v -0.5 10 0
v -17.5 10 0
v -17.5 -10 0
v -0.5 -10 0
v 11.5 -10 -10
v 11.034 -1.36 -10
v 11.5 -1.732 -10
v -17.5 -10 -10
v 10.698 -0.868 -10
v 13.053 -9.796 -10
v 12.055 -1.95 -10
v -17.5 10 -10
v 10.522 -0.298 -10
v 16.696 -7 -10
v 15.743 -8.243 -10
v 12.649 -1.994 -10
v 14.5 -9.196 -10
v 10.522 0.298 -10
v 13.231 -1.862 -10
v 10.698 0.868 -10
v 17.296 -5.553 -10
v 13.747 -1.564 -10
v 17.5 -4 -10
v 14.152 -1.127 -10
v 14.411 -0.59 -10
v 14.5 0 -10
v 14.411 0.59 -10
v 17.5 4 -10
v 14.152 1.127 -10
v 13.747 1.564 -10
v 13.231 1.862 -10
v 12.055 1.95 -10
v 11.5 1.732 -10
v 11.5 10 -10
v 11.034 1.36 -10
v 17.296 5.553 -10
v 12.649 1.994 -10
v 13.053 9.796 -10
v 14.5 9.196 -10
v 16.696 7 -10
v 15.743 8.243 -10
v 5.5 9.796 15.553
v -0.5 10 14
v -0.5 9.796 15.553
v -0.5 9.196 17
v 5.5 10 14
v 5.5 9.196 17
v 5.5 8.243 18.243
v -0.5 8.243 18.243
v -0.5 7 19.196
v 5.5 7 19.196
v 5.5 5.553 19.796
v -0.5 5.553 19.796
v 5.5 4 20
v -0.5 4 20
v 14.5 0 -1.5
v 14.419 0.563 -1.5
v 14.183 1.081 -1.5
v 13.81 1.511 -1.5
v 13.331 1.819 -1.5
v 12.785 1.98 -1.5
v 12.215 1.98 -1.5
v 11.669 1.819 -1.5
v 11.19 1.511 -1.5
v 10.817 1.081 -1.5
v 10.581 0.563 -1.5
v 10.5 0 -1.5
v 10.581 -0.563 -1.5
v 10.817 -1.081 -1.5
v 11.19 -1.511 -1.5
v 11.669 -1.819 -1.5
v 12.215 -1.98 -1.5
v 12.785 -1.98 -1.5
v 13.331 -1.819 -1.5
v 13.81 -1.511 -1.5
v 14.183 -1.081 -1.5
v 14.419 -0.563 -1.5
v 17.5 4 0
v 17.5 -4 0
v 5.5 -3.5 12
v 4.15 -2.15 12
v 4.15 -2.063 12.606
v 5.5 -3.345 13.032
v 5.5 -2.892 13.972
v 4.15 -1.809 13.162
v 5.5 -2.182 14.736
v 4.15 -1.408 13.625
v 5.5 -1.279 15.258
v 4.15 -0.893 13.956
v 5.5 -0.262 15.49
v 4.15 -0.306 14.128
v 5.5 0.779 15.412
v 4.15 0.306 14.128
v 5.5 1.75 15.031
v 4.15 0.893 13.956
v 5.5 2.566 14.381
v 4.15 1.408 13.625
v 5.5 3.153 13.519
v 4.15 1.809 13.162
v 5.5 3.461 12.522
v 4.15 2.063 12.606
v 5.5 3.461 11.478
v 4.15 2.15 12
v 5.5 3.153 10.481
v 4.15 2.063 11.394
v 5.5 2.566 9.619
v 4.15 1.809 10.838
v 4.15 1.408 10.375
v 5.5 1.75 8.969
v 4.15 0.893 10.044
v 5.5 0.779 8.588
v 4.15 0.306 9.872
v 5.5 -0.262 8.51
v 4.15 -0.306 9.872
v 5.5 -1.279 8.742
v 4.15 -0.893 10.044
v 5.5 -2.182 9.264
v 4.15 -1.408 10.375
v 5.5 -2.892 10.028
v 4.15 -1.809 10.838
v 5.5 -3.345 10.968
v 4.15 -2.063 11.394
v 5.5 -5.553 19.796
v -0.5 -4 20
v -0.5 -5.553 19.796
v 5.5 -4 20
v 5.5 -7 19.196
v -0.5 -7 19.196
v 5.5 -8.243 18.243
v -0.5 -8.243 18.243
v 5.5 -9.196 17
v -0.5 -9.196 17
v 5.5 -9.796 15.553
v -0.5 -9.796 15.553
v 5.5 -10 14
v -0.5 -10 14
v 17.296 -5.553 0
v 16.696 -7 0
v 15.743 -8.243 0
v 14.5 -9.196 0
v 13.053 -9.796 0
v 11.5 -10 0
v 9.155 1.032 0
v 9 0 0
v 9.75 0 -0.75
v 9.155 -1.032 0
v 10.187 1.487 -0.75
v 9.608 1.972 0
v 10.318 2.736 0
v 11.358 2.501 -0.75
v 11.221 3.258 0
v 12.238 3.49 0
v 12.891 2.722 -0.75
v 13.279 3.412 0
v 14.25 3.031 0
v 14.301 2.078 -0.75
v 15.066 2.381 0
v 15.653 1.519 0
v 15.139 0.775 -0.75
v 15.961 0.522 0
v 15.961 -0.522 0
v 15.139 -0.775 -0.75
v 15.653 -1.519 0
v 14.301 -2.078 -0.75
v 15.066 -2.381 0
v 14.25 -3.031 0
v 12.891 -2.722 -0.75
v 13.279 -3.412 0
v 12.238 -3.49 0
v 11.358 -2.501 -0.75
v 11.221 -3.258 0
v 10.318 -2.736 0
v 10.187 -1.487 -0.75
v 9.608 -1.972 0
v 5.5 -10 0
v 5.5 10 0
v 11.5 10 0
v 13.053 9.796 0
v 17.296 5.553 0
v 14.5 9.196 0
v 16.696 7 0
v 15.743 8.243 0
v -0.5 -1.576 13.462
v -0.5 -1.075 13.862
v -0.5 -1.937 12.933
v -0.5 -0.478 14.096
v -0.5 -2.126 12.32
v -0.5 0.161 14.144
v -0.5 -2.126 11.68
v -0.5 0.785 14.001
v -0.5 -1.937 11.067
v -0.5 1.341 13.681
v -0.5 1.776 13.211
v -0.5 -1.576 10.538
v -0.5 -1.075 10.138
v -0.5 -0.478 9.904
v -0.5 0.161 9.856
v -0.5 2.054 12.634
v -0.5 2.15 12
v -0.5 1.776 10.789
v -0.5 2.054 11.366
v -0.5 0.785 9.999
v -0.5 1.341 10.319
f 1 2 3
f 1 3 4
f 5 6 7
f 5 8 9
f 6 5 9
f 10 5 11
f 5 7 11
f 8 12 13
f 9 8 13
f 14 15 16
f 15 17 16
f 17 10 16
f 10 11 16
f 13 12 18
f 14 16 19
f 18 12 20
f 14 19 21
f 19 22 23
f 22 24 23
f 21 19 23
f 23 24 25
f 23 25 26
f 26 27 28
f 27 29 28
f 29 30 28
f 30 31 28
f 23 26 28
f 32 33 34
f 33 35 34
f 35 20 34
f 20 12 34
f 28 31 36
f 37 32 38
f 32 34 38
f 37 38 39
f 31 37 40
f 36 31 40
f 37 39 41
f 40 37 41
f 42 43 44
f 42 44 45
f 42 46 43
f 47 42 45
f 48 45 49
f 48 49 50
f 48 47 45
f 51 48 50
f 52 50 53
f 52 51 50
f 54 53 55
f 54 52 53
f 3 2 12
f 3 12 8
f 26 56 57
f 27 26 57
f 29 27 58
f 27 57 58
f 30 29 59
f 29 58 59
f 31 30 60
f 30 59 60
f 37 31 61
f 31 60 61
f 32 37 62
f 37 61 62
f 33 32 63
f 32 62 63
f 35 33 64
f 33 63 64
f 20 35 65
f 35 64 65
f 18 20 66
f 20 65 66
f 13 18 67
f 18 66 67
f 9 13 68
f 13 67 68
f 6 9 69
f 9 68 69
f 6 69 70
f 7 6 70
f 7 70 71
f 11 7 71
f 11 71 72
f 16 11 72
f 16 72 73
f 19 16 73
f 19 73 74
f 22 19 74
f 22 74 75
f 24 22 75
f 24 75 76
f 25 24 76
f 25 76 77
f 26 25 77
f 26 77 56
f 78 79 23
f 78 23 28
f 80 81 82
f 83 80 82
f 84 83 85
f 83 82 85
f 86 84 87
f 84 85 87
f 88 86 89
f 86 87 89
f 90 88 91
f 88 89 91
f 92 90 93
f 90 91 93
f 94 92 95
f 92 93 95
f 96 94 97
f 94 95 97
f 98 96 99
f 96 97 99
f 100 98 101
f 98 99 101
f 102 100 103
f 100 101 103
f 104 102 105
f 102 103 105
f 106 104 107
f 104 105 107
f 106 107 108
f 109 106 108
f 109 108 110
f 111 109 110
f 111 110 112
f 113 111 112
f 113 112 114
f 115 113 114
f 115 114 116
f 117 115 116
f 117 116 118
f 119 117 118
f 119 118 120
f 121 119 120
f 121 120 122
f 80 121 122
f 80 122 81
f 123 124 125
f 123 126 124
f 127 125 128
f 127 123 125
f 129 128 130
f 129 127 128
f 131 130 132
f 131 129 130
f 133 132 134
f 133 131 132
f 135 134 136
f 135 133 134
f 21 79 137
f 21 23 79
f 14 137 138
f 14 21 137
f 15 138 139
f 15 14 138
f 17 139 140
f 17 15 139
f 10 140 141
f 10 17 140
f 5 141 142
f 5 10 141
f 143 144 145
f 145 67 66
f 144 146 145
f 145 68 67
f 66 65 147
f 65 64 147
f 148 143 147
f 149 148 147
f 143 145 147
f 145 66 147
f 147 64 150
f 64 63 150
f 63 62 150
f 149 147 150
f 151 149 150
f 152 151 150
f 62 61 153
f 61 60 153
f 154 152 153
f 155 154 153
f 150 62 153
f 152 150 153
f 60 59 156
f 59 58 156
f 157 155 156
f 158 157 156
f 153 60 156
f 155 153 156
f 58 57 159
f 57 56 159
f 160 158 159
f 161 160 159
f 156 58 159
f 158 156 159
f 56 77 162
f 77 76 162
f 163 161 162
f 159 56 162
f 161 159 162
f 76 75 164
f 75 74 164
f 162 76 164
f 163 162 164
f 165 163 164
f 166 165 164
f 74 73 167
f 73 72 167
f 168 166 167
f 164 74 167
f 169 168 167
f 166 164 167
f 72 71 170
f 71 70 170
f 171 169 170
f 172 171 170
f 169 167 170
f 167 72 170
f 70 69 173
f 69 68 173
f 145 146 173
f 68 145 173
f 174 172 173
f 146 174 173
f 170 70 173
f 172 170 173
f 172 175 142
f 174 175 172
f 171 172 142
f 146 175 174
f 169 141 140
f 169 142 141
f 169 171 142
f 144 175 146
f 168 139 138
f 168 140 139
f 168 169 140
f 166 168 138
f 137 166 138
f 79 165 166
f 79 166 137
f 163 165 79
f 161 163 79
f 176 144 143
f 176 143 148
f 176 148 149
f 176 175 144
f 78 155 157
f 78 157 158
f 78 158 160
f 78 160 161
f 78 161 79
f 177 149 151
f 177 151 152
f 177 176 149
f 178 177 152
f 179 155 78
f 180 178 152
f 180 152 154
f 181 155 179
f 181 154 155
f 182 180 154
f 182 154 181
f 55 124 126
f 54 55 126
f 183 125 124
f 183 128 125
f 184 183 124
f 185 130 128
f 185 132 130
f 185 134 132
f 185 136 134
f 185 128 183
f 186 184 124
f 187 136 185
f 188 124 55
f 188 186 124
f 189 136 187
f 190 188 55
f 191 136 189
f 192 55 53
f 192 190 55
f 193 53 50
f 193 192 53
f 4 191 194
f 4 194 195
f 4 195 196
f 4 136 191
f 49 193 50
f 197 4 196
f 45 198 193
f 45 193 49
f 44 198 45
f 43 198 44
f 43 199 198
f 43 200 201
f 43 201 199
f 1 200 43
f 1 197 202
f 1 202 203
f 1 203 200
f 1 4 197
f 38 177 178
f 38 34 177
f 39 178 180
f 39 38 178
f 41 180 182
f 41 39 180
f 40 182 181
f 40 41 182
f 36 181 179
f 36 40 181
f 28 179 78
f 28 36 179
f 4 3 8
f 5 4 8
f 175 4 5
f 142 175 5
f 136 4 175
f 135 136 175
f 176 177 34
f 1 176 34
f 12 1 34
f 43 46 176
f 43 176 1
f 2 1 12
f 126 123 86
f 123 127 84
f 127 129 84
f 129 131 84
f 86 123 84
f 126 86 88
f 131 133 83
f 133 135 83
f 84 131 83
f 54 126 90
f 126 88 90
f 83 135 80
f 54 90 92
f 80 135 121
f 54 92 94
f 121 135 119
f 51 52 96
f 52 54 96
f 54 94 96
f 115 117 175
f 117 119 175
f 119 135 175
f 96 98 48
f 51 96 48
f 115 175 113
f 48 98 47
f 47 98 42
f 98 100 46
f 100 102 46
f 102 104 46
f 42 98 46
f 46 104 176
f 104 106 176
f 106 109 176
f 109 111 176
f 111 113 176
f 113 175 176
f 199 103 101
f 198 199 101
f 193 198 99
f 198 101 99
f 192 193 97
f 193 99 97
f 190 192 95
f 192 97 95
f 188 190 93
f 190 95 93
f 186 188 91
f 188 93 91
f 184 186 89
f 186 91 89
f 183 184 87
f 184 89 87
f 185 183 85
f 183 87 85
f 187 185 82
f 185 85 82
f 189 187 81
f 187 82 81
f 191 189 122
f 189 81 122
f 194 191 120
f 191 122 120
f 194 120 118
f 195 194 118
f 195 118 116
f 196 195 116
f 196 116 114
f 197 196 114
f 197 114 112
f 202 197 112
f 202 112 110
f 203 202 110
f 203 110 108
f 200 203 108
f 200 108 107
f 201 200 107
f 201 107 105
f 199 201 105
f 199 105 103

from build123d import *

# Parameters (mm, degrees)
F0_R            = 2
F1_DEPTH        = 10
F2_W            = 6
F2_H            = 20
F3_DEPTH        = 20
F4_R            = 2.15
F5_DEPTH        = 25
F6_R            = 6
F8_D            = 4
F8_DEPTH        = 7
F8_CSINK_D      = 7
F8_CSINK_ANGLE  = 90
F10_D           = 4
F10_DEPTH       = 12
F10_CSINK_D     = 7
F10_CSINK_ANGLE = 90


with BuildPart() as f1:
    # F0 (on Top) → F1 (new body)
    with BuildSketch(Plane.XY):
        with Locations((12.5, 0)):
            Circle(F0_R)
        Polygon((17.5, 0), (17.5, 10), (-17.5, 10), (-17.5, -10), (17.5, -10), align=None)
        with Locations((12.5, 0)):
            Circle(F0_R, mode=Mode.SUBTRACT)
    extrude(amount=-F1_DEPTH)

    # F2 (on face) → F3 (join)
    with BuildSketch(Plane.XY):
        with Locations((2.5, 0)):
            Rectangle(F2_W, F2_H)
    extrude(amount=F3_DEPTH)

    # F4 (on face) → F5 (cut)
    with BuildSketch(Plane.YZ.offset(5.5)):
        with Locations((0, 12)):
            Circle(F4_R)
    extrude(amount=-F5_DEPTH, mode=Mode.SUBTRACT)

    # F6
    f6_edges = [f1.edges().sort_by_distance(p)[0] for p in [
        (2.5, -10, 20),
        (2.5, 10, 20),
        (17.5, 10, -5),
        (17.5, -10, -5),
    ]]
    fillet(f6_edges, radius=F6_R)

    # F8
    with Locations(Plane.YZ.offset(5.5)):
        with Locations((0, 12)):
            CounterSinkHole(F8_D / 2, F8_CSINK_D / 2, depth=F8_DEPTH, counter_sink_angle=F8_CSINK_ANGLE)

    # F10
    with Locations(Plane.XY):
        with Locations((12.5, 0)):
            CounterSinkHole(F10_D / 2, F10_CSINK_D / 2, depth=F10_DEPTH, counter_sink_angle=F10_CSINK_ANGLE)


solid = f1.part
